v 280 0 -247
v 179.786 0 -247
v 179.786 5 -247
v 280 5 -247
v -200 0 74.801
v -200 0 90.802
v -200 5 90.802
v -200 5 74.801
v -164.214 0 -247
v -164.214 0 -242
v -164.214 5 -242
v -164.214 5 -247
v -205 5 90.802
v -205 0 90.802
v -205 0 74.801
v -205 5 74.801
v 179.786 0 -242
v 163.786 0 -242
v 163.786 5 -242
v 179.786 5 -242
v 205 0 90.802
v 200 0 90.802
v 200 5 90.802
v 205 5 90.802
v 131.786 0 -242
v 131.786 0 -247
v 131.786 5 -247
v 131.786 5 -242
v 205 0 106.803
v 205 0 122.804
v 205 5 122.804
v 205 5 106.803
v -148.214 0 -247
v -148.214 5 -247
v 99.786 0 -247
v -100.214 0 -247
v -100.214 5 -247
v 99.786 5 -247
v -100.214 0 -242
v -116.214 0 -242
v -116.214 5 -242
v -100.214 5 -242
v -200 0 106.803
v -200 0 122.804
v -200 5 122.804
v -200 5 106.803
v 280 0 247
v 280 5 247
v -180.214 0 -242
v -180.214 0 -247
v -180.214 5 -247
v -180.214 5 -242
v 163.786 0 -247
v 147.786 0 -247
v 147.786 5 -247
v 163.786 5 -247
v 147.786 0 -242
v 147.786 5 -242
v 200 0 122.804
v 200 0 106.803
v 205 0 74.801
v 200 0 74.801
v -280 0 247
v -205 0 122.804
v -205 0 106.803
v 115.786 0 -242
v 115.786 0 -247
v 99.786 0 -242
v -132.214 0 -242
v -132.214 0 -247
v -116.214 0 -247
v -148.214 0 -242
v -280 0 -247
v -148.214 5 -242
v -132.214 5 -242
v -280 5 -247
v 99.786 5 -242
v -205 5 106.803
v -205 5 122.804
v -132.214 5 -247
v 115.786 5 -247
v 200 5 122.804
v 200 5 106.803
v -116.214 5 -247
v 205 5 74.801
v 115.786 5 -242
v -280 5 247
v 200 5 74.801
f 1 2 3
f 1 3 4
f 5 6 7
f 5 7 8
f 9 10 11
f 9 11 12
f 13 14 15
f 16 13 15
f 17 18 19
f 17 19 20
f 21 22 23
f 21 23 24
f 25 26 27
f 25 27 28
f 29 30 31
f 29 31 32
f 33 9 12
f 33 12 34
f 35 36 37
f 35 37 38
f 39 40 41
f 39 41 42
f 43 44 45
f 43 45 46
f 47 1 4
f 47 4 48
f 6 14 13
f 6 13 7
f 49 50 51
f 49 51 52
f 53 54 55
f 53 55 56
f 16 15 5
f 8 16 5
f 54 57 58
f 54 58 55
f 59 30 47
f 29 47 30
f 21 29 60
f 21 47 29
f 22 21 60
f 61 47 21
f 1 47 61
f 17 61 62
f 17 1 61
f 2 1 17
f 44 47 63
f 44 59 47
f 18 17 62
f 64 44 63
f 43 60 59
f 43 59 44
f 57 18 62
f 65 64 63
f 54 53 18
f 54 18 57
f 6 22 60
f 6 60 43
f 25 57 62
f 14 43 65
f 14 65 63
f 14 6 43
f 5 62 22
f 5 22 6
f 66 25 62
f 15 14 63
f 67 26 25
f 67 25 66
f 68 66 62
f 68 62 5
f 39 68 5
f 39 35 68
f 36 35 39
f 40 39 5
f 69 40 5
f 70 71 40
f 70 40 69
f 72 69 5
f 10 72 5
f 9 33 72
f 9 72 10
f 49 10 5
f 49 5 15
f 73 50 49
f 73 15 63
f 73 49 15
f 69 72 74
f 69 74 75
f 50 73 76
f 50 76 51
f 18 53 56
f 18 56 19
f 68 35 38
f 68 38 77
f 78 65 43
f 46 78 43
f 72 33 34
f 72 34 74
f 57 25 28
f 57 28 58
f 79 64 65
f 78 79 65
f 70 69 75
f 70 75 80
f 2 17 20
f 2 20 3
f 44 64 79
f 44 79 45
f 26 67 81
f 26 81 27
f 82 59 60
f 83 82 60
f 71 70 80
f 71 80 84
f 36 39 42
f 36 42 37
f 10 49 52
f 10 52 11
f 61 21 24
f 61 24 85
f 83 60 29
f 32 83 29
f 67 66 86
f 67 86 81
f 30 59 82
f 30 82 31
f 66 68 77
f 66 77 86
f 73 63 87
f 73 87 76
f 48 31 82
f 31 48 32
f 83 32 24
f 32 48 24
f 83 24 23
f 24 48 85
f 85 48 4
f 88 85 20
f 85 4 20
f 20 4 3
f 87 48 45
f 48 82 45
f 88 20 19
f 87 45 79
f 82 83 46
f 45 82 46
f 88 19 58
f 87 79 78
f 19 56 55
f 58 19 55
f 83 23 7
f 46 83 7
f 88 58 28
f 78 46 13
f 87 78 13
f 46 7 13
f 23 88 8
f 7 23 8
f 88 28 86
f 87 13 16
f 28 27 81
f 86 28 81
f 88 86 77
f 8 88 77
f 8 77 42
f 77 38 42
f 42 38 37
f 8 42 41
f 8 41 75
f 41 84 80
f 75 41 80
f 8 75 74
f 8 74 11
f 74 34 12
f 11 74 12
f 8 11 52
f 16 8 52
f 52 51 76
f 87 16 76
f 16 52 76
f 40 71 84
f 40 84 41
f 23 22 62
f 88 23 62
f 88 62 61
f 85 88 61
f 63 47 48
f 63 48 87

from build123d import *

# Parameters (mm, degrees)
SKETCH1_W           = 5
SKETCH1_H           = 16.000962119
BOSS_EXTRUDE1_DEPTH = 5


with BuildPart() as part:
    # Sketch1 → Boss-Extrude1 (new body)
    with BuildSketch(Plane(origin=(0, 0, 0), x_dir=(1, 0, 0), z_dir=(0, 1, 0))):
        Polygon((-280, 247), (-180.213569057, 247), (-180.213569057, 242), (-164.213569057, 242), (-164.213569057, 247), (-148.213569057, 247), (-148.213569057, 242), (-132.213569057, 242), (-132.213569057, 247), (-116.213569057, 247), (-116.213569057, 242), (-100.213569057, 242), (-100.213569057, 247), (99.786430943, 247), (99.786430943, 242), (115.786430943, 242), (115.786430943, 247), (131.786430943, 247), (131.786430943, 242), (147.786430943, 242), (147.786430943, 247), (163.786430943, 247), (163.786430943, 242), (179.786430943, 242), (179.786430943, 247), (280, 247), (280, -247), (-280, -247), align=None)
        with Locations((-202.5, -82.801443178)):
            Rectangle(SKETCH1_W, SKETCH1_H, mode=Mode.SUBTRACT)
        with Locations((202.5, -114.803367415)):
            Rectangle(SKETCH1_W, SKETCH1_H, mode=Mode.SUBTRACT)
        with Locations((202.5, -82.801443178)):
            Rectangle(SKETCH1_W, SKETCH1_H, mode=Mode.SUBTRACT)
        with Locations((-202.5, -114.803367415)):
            Rectangle(SKETCH1_W, SKETCH1_H, mode=Mode.SUBTRACT)
    extrude(amount=BOSS_EXTRUDE1_DEPTH)


solid = part.part
